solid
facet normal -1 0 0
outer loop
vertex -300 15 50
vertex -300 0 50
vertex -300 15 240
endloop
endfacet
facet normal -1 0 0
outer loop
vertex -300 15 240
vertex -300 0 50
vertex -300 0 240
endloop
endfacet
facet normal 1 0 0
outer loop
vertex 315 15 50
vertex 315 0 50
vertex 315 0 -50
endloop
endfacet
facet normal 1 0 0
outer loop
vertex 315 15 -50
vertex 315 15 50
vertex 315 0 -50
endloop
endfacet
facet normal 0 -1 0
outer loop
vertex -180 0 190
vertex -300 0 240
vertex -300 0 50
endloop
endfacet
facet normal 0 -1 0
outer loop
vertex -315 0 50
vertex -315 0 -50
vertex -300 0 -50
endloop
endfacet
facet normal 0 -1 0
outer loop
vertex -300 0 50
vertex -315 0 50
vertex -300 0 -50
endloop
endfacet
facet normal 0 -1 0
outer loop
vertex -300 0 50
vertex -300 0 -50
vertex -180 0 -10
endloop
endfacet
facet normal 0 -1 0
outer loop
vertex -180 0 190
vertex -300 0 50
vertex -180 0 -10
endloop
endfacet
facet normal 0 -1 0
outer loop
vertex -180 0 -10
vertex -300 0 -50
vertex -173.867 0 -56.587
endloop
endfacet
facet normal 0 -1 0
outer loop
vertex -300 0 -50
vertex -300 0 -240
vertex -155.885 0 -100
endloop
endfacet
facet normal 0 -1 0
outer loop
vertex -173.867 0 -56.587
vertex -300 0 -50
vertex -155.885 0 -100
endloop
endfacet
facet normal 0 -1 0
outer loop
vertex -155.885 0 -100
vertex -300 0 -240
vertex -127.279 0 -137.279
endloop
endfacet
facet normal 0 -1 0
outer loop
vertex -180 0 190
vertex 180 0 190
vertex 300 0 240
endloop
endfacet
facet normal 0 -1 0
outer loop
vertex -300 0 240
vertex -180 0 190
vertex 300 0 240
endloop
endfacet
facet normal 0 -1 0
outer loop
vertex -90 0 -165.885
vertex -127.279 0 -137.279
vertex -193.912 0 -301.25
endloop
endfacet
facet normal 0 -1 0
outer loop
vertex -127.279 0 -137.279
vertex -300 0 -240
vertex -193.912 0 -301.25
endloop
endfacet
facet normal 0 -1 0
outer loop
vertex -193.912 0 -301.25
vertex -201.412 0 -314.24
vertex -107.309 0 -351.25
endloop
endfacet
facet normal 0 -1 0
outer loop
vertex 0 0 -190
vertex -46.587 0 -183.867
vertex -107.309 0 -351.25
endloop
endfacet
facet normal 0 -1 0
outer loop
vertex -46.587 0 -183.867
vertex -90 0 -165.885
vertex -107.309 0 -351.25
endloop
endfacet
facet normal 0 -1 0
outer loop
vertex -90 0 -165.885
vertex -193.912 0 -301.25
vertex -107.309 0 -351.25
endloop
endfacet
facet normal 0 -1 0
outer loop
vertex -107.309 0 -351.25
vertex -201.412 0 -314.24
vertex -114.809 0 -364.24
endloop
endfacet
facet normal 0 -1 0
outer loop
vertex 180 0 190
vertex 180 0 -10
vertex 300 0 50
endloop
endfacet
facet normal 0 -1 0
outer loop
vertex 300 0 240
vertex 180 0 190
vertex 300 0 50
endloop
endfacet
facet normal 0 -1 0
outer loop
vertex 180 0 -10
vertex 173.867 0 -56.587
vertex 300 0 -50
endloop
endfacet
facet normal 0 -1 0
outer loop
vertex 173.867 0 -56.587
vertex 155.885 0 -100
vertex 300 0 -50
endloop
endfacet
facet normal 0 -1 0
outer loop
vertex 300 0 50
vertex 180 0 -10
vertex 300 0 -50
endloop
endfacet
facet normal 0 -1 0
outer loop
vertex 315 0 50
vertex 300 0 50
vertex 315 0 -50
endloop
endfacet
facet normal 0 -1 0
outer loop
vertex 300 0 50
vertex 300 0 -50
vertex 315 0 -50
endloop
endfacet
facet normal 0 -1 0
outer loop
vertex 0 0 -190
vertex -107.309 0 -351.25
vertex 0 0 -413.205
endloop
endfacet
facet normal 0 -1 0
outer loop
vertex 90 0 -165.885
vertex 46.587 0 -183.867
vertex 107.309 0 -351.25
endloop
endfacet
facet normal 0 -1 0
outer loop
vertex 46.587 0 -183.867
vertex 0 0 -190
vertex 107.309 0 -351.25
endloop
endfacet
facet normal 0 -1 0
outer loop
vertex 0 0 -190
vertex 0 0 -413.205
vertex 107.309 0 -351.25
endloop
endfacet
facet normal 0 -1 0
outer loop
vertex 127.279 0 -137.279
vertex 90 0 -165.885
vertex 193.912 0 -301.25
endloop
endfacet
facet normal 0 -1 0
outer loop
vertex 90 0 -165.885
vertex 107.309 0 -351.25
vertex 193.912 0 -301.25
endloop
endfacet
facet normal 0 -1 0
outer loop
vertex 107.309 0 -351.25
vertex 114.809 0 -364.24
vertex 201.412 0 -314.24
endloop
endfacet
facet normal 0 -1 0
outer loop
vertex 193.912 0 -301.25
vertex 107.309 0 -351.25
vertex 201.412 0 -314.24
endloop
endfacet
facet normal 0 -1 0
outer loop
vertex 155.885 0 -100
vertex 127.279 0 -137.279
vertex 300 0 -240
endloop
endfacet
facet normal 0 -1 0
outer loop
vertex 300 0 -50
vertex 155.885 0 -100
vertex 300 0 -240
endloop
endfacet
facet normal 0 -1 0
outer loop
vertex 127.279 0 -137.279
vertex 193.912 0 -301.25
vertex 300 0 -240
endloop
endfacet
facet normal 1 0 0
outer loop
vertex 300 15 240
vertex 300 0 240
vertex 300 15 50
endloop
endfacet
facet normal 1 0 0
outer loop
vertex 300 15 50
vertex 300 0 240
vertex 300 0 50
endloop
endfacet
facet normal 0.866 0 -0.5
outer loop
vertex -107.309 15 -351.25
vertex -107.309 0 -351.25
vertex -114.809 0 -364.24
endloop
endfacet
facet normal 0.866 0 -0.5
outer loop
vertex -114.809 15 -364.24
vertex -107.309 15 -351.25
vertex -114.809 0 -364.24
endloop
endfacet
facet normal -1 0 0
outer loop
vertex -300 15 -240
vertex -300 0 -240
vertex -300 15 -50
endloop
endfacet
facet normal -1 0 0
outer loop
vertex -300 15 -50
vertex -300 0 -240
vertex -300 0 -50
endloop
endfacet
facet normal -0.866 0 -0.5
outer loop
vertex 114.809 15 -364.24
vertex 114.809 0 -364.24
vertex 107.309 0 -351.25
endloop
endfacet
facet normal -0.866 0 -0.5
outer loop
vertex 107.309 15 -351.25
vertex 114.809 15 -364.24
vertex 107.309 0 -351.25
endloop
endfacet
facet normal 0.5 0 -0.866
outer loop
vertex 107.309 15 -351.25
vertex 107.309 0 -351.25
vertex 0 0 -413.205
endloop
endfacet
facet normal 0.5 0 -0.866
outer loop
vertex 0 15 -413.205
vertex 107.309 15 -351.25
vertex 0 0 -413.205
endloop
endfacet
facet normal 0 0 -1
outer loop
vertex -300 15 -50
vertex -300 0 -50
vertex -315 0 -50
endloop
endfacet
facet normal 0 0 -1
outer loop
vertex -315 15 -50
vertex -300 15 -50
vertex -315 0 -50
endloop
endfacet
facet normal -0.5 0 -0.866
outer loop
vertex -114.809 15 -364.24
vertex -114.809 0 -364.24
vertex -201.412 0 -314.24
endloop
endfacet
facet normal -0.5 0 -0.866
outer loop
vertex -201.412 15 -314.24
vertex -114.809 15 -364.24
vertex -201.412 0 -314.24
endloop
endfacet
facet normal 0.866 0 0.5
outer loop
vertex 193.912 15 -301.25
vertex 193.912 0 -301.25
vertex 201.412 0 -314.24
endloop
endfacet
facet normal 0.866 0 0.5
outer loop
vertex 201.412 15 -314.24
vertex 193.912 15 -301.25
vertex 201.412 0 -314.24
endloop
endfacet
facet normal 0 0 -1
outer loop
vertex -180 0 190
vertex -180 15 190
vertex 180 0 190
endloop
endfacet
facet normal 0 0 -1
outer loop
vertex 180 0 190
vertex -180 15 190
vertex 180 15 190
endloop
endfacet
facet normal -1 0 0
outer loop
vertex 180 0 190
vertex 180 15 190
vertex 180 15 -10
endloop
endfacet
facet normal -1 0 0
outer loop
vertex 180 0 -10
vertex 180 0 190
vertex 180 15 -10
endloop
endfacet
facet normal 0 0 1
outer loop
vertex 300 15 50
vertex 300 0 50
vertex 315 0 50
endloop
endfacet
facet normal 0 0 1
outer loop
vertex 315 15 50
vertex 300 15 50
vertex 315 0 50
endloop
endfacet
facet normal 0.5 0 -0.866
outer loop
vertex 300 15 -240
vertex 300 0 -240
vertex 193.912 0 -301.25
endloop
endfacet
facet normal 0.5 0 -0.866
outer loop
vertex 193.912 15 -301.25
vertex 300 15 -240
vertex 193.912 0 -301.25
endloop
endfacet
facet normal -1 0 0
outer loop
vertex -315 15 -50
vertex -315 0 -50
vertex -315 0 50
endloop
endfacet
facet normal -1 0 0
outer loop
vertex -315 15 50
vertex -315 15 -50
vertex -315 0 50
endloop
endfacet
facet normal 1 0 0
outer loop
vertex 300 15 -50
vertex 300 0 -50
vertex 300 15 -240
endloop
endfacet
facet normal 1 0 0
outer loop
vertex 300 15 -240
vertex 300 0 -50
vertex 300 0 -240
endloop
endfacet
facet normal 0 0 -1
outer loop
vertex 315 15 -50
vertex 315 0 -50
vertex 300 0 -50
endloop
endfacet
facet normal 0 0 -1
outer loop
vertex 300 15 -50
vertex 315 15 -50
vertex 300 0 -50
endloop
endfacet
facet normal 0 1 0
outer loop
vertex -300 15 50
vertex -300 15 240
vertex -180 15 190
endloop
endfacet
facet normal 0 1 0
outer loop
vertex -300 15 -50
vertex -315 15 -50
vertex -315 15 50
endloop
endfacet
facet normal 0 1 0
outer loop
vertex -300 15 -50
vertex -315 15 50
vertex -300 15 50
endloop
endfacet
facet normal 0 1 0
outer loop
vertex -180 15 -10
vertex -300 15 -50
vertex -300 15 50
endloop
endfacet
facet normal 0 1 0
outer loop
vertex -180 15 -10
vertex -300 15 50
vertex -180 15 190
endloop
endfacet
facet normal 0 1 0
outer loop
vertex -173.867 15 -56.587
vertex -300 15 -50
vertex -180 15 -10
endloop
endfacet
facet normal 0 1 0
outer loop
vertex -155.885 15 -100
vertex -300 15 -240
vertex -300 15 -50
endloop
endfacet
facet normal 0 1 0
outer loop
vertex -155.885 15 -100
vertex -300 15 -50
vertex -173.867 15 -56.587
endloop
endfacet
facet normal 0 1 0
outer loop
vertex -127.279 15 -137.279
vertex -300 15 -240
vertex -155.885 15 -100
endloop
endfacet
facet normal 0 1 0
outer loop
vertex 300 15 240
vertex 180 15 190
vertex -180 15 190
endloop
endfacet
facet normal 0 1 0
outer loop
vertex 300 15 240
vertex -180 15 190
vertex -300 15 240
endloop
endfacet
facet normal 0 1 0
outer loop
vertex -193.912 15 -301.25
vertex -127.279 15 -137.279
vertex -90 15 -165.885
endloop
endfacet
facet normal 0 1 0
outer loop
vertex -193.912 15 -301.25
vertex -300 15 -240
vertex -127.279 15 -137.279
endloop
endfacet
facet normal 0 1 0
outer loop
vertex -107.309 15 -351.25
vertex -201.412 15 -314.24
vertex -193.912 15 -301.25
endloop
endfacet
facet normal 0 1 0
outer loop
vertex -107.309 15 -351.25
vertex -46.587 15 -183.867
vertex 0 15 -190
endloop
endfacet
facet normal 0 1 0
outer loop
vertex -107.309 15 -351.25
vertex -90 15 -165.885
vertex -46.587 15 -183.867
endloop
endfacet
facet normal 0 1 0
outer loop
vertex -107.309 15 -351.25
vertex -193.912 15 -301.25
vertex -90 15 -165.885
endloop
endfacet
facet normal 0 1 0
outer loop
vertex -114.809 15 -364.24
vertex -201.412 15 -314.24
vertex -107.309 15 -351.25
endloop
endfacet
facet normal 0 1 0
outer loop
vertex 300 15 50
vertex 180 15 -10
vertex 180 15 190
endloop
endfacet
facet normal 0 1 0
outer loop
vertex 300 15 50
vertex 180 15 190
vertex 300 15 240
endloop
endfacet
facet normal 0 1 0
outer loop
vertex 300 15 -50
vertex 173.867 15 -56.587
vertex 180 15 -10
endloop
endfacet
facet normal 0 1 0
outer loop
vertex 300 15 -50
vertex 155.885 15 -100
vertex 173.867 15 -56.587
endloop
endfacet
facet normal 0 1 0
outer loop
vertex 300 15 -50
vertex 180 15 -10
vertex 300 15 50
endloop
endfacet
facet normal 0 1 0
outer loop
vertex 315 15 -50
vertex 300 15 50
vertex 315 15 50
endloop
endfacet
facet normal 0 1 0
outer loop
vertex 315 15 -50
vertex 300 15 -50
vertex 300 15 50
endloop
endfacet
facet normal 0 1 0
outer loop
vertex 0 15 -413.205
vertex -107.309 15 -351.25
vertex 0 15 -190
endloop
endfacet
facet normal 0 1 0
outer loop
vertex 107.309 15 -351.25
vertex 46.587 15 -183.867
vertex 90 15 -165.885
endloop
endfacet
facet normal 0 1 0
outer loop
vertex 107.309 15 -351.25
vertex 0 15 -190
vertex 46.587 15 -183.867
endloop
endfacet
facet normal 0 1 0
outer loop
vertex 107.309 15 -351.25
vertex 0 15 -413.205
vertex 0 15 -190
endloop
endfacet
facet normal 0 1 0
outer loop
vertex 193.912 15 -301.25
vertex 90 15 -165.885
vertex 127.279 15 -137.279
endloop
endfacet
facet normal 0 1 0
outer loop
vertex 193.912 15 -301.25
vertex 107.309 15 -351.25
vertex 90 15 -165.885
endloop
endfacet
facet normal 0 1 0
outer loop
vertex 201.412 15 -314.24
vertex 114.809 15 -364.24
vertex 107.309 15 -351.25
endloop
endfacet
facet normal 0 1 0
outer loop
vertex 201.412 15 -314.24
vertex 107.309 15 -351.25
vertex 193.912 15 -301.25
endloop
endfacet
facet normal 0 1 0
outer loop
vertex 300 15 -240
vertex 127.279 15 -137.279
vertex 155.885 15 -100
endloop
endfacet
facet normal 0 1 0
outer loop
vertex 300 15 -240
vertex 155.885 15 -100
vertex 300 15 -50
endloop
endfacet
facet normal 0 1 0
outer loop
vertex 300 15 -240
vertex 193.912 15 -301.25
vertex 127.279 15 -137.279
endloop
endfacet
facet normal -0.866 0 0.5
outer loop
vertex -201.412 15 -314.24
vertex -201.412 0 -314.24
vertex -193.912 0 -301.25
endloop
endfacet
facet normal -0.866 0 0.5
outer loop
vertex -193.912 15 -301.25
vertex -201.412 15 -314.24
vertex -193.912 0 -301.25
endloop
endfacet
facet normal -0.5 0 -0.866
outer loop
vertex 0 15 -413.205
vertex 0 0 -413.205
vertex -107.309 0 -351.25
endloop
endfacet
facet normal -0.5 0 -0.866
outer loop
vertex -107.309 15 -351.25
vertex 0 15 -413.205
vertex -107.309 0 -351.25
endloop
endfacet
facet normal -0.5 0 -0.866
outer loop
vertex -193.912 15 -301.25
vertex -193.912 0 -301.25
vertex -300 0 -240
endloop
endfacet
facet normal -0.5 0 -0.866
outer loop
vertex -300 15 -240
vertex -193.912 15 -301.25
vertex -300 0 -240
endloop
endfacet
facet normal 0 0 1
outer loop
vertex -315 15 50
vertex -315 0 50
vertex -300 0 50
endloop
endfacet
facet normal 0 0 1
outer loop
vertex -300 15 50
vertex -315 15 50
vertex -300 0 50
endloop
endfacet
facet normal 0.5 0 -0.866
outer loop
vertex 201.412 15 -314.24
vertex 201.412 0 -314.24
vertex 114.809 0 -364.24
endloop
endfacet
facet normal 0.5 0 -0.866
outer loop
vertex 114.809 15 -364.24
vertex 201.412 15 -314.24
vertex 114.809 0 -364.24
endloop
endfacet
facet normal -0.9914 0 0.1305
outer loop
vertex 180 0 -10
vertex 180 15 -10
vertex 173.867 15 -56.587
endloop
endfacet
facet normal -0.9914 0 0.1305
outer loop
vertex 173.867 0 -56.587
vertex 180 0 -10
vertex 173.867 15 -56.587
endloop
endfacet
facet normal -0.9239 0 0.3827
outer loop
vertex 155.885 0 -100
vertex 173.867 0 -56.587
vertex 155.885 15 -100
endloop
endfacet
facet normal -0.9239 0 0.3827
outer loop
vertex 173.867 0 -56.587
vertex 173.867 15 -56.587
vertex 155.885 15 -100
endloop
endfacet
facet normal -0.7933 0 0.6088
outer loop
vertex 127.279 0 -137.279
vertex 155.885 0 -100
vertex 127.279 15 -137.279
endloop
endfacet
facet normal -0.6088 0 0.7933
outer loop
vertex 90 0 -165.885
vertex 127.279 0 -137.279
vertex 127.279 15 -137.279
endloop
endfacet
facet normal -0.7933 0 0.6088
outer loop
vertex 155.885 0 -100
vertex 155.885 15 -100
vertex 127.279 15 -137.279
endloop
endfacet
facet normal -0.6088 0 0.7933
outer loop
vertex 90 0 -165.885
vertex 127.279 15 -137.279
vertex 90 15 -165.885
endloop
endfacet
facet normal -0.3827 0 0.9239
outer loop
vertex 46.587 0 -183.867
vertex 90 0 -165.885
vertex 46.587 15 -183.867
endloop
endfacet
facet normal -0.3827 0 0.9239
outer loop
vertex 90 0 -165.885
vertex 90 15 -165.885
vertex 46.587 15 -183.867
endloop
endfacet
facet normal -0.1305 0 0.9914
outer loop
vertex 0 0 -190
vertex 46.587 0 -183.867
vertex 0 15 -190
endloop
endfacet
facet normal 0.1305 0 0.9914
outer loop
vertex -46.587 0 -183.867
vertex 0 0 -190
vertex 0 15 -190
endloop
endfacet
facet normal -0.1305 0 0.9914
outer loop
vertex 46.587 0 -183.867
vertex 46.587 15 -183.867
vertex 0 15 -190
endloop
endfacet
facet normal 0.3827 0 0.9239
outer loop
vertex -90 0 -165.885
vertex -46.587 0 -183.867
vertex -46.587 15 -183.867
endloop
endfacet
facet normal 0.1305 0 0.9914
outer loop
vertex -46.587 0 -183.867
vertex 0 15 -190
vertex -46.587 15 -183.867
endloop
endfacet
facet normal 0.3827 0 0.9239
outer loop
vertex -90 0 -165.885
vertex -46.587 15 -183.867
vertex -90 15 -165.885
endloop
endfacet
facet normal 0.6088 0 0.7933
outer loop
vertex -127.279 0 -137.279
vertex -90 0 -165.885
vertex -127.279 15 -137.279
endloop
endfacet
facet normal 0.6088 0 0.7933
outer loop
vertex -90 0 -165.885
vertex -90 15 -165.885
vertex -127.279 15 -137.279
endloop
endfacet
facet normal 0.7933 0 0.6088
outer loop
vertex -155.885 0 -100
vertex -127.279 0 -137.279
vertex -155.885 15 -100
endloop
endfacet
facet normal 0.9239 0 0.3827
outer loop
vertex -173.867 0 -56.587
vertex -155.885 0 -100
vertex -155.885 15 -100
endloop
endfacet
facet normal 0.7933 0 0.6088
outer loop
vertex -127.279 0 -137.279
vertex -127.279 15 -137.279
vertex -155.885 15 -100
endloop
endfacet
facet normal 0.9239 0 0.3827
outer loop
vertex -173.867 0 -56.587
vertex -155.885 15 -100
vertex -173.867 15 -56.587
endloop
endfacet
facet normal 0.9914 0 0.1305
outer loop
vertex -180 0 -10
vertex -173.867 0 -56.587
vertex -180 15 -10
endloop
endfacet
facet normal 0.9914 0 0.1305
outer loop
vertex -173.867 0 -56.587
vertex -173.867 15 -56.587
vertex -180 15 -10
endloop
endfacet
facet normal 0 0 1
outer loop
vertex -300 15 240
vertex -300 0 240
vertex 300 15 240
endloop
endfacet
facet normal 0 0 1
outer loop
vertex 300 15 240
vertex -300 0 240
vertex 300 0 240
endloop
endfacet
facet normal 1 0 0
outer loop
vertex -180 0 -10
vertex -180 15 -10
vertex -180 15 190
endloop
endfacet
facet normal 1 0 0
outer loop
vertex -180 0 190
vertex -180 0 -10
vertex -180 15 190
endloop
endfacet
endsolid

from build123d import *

# Parameters (mm, degrees)
BOSS_EXTRUDE1_DEPTH = 15
CUT_EXTRUDE2_REACH  = 17


with BuildPart() as part:
    # Sketch1 → Boss-Extrude1 (new body)
    with BuildSketch(Plane(origin=(0, 0, 0), x_dir=(1, 0, 0), z_dir=(0, 1, 0))):
        Polygon((-300, -240), (300, -240), (300, -50), (315, -50), (315, 50), (300, 50), (300, 240), (193.911888036, 301.25), (201.411888036, 314.240381057), (114.809347658, 364.240381057), (107.309347658, 351.25), (0, 413.205080757), (-107.309347658, 351.25), (-114.809347658, 364.240381057), (-201.411888036, 314.240381057), (-193.911888036, 301.25), (-300, 240), (-300, 50), (-315, 50), (-315, -50), (-300, -50), align=None)
    extrude(amount=BOSS_EXTRUDE1_DEPTH)

    # Sketch2 → Cut-Extrude2 (cut, up to next)
    with BuildSketch(Plane(origin=(0, 15, 0), x_dir=(1, 0, 0), z_dir=(0, 1, 0)), mode=Mode.PRIVATE) as cut_extrude2_sk1:
        with BuildLine():
            Line((-180, -190), (180, -190))
            Line((180, -190), (180, 10))
            ThreePointArc((180, 10), (0, 190), (-180, 10))
            Line((-180, 10), (-180, -190))
        make_face()
    cut_extrude2_tool1 = extrude(cut_extrude2_sk1.sketch, amount=-CUT_EXTRUDE2_REACH, mode=Mode.PRIVATE) & part.part
    add(cut_extrude2_tool1.solids().sort_by_distance((0, 15, 16.950098))[0], mode=Mode.SUBTRACT)


solid = part.part
